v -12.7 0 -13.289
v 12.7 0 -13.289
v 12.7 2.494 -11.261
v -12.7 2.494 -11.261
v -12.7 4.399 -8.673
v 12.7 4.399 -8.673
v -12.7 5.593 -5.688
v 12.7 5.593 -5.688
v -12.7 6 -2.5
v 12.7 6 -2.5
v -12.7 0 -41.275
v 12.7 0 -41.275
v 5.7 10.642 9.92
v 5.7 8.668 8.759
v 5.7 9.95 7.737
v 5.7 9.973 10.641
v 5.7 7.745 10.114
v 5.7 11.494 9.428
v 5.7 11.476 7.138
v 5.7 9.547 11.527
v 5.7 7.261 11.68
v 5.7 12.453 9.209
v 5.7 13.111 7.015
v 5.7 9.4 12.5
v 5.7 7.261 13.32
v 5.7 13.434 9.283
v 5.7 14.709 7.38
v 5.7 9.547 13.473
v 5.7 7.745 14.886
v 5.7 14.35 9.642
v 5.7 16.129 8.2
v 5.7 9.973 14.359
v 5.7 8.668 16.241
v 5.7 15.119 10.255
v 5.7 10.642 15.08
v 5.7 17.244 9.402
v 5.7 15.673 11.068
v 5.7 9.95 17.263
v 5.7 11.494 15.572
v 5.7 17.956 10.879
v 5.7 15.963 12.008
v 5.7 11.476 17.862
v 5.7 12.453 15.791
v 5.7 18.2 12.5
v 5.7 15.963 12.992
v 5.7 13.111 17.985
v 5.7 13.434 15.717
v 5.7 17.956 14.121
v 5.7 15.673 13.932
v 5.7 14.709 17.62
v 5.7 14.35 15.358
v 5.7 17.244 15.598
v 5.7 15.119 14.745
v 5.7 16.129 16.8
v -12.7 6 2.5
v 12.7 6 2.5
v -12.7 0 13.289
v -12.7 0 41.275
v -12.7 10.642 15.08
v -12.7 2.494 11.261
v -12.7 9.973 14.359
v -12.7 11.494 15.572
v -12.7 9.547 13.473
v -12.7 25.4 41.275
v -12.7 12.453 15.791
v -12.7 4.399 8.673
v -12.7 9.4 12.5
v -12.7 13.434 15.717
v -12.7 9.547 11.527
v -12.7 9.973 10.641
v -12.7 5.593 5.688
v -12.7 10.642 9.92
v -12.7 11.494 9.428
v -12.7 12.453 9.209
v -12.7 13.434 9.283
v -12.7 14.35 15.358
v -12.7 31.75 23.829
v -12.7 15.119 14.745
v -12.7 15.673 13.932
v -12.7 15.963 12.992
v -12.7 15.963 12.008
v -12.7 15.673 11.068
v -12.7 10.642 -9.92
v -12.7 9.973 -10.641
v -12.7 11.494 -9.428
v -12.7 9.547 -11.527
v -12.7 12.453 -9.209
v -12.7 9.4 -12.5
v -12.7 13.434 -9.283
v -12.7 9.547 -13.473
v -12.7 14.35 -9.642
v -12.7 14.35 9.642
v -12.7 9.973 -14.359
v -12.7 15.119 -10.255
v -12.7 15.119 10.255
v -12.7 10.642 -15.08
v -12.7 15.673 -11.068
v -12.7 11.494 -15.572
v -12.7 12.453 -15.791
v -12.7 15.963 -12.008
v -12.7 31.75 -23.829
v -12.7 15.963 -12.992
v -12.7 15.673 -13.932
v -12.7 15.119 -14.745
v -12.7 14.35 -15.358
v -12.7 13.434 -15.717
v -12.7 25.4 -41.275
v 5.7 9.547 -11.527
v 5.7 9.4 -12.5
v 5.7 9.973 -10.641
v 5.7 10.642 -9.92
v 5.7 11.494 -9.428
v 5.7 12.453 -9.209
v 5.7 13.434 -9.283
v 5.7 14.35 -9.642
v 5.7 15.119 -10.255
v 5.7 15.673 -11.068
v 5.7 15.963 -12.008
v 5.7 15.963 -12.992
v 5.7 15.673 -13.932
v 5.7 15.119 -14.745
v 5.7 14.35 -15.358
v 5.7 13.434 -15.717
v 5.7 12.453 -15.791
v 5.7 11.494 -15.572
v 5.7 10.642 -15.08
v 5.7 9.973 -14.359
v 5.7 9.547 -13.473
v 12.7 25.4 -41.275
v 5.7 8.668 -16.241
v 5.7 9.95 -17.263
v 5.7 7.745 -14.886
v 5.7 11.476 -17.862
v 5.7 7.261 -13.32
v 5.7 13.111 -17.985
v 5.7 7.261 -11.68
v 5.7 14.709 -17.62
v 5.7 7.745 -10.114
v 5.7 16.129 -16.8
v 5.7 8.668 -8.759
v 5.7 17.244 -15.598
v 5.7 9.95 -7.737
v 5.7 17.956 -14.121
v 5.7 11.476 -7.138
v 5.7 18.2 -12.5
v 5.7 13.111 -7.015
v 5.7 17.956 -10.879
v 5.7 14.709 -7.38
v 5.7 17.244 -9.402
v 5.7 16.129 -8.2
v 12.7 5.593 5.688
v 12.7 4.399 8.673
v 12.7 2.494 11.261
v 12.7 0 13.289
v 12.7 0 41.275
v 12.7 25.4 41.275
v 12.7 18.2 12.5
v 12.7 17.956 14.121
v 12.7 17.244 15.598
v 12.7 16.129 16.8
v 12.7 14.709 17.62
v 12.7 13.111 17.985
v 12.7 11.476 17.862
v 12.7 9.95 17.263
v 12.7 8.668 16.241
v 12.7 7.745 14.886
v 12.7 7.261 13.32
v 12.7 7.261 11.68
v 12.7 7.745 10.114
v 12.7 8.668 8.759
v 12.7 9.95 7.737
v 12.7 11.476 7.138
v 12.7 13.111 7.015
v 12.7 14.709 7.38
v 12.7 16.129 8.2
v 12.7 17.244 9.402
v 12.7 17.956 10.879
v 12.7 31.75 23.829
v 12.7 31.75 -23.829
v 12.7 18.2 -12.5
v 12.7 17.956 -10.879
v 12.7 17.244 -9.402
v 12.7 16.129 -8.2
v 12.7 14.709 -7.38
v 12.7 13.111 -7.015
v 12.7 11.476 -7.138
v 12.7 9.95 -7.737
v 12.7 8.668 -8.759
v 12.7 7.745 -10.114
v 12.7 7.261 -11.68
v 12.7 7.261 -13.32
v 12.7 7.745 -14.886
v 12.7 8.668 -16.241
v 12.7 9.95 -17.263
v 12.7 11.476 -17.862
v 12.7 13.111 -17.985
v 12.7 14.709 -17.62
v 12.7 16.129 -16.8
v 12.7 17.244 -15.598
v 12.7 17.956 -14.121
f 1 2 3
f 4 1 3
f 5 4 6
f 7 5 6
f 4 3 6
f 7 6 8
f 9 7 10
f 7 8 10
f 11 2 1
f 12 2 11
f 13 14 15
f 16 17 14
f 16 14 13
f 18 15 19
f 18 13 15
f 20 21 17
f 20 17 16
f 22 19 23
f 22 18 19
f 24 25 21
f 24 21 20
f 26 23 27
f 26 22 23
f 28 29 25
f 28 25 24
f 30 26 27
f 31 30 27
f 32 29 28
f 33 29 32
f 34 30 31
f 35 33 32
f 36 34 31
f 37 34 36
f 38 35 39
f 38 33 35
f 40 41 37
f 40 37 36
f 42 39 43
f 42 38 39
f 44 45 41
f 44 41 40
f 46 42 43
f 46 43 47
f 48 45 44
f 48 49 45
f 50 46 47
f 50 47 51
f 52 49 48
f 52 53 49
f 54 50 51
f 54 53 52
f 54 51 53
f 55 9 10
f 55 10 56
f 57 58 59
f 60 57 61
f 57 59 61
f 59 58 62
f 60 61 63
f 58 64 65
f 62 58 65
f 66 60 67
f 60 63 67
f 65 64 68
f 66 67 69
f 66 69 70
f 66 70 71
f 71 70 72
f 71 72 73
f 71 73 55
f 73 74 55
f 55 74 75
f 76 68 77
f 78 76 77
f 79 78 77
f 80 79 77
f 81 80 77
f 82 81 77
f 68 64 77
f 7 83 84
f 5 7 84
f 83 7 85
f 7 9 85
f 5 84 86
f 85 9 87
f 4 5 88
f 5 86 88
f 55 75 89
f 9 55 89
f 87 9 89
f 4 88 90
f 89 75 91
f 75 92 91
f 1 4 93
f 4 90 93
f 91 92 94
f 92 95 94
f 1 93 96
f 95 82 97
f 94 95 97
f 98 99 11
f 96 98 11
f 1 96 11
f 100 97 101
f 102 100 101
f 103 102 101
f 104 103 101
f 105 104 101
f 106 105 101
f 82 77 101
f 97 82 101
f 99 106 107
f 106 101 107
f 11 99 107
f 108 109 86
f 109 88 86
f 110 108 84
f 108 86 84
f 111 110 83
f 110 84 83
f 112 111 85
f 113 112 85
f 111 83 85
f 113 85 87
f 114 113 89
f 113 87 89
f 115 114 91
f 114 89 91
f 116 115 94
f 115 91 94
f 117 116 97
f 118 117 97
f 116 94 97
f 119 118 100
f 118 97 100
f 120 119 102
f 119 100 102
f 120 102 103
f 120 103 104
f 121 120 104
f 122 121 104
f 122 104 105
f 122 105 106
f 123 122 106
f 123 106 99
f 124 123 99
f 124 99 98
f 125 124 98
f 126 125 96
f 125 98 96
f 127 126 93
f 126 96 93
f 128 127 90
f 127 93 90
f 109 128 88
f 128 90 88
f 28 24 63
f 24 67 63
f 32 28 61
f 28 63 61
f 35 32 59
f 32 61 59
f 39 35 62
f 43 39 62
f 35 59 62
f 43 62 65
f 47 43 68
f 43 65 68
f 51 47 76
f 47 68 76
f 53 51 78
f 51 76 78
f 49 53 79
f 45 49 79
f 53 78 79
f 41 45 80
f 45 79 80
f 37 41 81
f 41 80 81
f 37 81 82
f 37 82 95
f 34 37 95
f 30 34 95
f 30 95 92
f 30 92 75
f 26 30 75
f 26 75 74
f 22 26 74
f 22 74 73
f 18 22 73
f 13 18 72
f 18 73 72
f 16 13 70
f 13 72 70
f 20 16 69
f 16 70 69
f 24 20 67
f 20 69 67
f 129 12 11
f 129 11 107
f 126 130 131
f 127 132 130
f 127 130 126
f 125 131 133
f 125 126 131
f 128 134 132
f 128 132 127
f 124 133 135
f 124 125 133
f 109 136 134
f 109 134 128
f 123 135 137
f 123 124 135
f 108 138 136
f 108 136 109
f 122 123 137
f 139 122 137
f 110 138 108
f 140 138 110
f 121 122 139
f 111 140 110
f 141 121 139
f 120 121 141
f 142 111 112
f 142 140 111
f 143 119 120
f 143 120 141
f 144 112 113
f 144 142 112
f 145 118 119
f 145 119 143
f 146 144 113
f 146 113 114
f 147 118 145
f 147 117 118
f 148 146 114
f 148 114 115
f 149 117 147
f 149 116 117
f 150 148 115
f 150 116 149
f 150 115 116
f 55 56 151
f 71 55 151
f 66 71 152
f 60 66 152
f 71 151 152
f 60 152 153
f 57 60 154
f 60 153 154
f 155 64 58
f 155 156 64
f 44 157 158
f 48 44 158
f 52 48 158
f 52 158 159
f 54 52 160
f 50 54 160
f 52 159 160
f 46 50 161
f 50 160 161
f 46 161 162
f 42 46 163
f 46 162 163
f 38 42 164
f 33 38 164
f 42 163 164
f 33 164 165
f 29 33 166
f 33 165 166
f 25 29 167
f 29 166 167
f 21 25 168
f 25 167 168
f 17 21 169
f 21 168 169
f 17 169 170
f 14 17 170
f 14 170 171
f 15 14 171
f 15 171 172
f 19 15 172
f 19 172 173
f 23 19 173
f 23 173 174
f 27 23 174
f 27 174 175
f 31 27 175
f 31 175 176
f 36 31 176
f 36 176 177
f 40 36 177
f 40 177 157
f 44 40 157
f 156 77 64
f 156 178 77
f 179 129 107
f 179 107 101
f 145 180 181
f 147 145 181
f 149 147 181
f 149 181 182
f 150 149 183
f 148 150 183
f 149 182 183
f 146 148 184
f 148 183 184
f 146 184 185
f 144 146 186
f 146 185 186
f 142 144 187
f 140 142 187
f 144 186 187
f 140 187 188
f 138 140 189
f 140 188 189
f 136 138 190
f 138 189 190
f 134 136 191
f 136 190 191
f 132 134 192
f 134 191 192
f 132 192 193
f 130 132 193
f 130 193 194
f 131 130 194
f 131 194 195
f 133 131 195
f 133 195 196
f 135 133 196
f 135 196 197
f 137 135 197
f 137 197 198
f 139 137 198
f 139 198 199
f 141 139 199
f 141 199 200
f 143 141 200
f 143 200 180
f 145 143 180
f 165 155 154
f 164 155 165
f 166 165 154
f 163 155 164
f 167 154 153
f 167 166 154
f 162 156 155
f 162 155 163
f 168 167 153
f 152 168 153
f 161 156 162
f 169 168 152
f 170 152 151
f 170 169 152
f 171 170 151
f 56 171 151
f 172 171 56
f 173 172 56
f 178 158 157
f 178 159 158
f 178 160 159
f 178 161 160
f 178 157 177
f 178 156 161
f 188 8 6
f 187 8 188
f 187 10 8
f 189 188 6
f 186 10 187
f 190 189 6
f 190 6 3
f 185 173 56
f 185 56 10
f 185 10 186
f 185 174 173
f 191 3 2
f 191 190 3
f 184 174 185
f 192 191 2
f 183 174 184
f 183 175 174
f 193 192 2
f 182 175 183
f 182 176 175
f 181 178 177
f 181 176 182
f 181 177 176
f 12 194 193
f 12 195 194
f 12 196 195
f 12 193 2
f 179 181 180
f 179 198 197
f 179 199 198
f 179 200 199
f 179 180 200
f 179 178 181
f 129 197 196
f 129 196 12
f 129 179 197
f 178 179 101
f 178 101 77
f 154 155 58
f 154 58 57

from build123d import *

# Parameters (mm, degrees)
BOSS_EXTRUDE1_DEPTH                                 = 12.7
CBORE_FOR_M6_HEX_SOCKET_HEAD_CAP_SCREW1_D           = 6.6
CBORE_FOR_M6_HEX_SOCKET_HEAD_CAP_SCREW1_CBORE_D     = 11
CBORE_FOR_M6_HEX_SOCKET_HEAD_CAP_SCREW1_CBORE_DEPTH = 7
CUT_EXTRUDE1_DEPTH                                  = 58.938313101


with BuildPart() as part:
    # Sketch1 → Boss-Extrude1 (new, symmetric)
    with BuildSketch(Plane(origin=(0, 0, 0), x_dir=(0, 0, -1), z_dir=(1, 0, 0))):
        Polygon((-41.275, 0), (41.275, 0), (41.275, 25.4), (23.828518386, 31.75), (-23.828518386, 31.75), (-41.275, 25.4), align=None)
    extrude(amount=BOSS_EXTRUDE1_DEPTH, both=True)

    # CBORE for M6 Hex Socket Head Cap Screw1 (through all)
    with Locations(Plane(origin=(12.7, 13.34258249, -21.373421522), x_dir=(0, 1, 0), z_dir=(1, 0, 0))):
        with Locations((-0.64258249, 33.873421522), (-0.64258249, 8.873421522)):
            CounterBoreHole(CBORE_FOR_M6_HEX_SOCKET_HEAD_CAP_SCREW1_D / 2, CBORE_FOR_M6_HEX_SOCKET_HEAD_CAP_SCREW1_CBORE_D / 2, CBORE_FOR_M6_HEX_SOCKET_HEAD_CAP_SCREW1_CBORE_DEPTH)

    # Sketch5 → Cut-Extrude1 (cut, through all)
    with BuildSketch(Plane(origin=(12.7, 0, 0), x_dir=(0, 0, -1), z_dir=(1, 0, 0))):
        with BuildLine():
            Line((15.2, -15), (15.2, -6.7))
            ThreePointArc((15.2, -6.7), (11.480256121, 2.280256121), (2.5, 6))
            Line((2.5, 6), (-2.5, 6))
            ThreePointArc((-2.5, 6), (-11.480256121, 2.280256121), (-15.2, -6.7))
            Line((-15.2, -6.7), (-15.2, -15))
            Line((-15.2, -15), (15.2, -15))
        make_face()
    extrude(amount=-CUT_EXTRUDE1_DEPTH, mode=Mode.SUBTRACT)


solid = part.part
